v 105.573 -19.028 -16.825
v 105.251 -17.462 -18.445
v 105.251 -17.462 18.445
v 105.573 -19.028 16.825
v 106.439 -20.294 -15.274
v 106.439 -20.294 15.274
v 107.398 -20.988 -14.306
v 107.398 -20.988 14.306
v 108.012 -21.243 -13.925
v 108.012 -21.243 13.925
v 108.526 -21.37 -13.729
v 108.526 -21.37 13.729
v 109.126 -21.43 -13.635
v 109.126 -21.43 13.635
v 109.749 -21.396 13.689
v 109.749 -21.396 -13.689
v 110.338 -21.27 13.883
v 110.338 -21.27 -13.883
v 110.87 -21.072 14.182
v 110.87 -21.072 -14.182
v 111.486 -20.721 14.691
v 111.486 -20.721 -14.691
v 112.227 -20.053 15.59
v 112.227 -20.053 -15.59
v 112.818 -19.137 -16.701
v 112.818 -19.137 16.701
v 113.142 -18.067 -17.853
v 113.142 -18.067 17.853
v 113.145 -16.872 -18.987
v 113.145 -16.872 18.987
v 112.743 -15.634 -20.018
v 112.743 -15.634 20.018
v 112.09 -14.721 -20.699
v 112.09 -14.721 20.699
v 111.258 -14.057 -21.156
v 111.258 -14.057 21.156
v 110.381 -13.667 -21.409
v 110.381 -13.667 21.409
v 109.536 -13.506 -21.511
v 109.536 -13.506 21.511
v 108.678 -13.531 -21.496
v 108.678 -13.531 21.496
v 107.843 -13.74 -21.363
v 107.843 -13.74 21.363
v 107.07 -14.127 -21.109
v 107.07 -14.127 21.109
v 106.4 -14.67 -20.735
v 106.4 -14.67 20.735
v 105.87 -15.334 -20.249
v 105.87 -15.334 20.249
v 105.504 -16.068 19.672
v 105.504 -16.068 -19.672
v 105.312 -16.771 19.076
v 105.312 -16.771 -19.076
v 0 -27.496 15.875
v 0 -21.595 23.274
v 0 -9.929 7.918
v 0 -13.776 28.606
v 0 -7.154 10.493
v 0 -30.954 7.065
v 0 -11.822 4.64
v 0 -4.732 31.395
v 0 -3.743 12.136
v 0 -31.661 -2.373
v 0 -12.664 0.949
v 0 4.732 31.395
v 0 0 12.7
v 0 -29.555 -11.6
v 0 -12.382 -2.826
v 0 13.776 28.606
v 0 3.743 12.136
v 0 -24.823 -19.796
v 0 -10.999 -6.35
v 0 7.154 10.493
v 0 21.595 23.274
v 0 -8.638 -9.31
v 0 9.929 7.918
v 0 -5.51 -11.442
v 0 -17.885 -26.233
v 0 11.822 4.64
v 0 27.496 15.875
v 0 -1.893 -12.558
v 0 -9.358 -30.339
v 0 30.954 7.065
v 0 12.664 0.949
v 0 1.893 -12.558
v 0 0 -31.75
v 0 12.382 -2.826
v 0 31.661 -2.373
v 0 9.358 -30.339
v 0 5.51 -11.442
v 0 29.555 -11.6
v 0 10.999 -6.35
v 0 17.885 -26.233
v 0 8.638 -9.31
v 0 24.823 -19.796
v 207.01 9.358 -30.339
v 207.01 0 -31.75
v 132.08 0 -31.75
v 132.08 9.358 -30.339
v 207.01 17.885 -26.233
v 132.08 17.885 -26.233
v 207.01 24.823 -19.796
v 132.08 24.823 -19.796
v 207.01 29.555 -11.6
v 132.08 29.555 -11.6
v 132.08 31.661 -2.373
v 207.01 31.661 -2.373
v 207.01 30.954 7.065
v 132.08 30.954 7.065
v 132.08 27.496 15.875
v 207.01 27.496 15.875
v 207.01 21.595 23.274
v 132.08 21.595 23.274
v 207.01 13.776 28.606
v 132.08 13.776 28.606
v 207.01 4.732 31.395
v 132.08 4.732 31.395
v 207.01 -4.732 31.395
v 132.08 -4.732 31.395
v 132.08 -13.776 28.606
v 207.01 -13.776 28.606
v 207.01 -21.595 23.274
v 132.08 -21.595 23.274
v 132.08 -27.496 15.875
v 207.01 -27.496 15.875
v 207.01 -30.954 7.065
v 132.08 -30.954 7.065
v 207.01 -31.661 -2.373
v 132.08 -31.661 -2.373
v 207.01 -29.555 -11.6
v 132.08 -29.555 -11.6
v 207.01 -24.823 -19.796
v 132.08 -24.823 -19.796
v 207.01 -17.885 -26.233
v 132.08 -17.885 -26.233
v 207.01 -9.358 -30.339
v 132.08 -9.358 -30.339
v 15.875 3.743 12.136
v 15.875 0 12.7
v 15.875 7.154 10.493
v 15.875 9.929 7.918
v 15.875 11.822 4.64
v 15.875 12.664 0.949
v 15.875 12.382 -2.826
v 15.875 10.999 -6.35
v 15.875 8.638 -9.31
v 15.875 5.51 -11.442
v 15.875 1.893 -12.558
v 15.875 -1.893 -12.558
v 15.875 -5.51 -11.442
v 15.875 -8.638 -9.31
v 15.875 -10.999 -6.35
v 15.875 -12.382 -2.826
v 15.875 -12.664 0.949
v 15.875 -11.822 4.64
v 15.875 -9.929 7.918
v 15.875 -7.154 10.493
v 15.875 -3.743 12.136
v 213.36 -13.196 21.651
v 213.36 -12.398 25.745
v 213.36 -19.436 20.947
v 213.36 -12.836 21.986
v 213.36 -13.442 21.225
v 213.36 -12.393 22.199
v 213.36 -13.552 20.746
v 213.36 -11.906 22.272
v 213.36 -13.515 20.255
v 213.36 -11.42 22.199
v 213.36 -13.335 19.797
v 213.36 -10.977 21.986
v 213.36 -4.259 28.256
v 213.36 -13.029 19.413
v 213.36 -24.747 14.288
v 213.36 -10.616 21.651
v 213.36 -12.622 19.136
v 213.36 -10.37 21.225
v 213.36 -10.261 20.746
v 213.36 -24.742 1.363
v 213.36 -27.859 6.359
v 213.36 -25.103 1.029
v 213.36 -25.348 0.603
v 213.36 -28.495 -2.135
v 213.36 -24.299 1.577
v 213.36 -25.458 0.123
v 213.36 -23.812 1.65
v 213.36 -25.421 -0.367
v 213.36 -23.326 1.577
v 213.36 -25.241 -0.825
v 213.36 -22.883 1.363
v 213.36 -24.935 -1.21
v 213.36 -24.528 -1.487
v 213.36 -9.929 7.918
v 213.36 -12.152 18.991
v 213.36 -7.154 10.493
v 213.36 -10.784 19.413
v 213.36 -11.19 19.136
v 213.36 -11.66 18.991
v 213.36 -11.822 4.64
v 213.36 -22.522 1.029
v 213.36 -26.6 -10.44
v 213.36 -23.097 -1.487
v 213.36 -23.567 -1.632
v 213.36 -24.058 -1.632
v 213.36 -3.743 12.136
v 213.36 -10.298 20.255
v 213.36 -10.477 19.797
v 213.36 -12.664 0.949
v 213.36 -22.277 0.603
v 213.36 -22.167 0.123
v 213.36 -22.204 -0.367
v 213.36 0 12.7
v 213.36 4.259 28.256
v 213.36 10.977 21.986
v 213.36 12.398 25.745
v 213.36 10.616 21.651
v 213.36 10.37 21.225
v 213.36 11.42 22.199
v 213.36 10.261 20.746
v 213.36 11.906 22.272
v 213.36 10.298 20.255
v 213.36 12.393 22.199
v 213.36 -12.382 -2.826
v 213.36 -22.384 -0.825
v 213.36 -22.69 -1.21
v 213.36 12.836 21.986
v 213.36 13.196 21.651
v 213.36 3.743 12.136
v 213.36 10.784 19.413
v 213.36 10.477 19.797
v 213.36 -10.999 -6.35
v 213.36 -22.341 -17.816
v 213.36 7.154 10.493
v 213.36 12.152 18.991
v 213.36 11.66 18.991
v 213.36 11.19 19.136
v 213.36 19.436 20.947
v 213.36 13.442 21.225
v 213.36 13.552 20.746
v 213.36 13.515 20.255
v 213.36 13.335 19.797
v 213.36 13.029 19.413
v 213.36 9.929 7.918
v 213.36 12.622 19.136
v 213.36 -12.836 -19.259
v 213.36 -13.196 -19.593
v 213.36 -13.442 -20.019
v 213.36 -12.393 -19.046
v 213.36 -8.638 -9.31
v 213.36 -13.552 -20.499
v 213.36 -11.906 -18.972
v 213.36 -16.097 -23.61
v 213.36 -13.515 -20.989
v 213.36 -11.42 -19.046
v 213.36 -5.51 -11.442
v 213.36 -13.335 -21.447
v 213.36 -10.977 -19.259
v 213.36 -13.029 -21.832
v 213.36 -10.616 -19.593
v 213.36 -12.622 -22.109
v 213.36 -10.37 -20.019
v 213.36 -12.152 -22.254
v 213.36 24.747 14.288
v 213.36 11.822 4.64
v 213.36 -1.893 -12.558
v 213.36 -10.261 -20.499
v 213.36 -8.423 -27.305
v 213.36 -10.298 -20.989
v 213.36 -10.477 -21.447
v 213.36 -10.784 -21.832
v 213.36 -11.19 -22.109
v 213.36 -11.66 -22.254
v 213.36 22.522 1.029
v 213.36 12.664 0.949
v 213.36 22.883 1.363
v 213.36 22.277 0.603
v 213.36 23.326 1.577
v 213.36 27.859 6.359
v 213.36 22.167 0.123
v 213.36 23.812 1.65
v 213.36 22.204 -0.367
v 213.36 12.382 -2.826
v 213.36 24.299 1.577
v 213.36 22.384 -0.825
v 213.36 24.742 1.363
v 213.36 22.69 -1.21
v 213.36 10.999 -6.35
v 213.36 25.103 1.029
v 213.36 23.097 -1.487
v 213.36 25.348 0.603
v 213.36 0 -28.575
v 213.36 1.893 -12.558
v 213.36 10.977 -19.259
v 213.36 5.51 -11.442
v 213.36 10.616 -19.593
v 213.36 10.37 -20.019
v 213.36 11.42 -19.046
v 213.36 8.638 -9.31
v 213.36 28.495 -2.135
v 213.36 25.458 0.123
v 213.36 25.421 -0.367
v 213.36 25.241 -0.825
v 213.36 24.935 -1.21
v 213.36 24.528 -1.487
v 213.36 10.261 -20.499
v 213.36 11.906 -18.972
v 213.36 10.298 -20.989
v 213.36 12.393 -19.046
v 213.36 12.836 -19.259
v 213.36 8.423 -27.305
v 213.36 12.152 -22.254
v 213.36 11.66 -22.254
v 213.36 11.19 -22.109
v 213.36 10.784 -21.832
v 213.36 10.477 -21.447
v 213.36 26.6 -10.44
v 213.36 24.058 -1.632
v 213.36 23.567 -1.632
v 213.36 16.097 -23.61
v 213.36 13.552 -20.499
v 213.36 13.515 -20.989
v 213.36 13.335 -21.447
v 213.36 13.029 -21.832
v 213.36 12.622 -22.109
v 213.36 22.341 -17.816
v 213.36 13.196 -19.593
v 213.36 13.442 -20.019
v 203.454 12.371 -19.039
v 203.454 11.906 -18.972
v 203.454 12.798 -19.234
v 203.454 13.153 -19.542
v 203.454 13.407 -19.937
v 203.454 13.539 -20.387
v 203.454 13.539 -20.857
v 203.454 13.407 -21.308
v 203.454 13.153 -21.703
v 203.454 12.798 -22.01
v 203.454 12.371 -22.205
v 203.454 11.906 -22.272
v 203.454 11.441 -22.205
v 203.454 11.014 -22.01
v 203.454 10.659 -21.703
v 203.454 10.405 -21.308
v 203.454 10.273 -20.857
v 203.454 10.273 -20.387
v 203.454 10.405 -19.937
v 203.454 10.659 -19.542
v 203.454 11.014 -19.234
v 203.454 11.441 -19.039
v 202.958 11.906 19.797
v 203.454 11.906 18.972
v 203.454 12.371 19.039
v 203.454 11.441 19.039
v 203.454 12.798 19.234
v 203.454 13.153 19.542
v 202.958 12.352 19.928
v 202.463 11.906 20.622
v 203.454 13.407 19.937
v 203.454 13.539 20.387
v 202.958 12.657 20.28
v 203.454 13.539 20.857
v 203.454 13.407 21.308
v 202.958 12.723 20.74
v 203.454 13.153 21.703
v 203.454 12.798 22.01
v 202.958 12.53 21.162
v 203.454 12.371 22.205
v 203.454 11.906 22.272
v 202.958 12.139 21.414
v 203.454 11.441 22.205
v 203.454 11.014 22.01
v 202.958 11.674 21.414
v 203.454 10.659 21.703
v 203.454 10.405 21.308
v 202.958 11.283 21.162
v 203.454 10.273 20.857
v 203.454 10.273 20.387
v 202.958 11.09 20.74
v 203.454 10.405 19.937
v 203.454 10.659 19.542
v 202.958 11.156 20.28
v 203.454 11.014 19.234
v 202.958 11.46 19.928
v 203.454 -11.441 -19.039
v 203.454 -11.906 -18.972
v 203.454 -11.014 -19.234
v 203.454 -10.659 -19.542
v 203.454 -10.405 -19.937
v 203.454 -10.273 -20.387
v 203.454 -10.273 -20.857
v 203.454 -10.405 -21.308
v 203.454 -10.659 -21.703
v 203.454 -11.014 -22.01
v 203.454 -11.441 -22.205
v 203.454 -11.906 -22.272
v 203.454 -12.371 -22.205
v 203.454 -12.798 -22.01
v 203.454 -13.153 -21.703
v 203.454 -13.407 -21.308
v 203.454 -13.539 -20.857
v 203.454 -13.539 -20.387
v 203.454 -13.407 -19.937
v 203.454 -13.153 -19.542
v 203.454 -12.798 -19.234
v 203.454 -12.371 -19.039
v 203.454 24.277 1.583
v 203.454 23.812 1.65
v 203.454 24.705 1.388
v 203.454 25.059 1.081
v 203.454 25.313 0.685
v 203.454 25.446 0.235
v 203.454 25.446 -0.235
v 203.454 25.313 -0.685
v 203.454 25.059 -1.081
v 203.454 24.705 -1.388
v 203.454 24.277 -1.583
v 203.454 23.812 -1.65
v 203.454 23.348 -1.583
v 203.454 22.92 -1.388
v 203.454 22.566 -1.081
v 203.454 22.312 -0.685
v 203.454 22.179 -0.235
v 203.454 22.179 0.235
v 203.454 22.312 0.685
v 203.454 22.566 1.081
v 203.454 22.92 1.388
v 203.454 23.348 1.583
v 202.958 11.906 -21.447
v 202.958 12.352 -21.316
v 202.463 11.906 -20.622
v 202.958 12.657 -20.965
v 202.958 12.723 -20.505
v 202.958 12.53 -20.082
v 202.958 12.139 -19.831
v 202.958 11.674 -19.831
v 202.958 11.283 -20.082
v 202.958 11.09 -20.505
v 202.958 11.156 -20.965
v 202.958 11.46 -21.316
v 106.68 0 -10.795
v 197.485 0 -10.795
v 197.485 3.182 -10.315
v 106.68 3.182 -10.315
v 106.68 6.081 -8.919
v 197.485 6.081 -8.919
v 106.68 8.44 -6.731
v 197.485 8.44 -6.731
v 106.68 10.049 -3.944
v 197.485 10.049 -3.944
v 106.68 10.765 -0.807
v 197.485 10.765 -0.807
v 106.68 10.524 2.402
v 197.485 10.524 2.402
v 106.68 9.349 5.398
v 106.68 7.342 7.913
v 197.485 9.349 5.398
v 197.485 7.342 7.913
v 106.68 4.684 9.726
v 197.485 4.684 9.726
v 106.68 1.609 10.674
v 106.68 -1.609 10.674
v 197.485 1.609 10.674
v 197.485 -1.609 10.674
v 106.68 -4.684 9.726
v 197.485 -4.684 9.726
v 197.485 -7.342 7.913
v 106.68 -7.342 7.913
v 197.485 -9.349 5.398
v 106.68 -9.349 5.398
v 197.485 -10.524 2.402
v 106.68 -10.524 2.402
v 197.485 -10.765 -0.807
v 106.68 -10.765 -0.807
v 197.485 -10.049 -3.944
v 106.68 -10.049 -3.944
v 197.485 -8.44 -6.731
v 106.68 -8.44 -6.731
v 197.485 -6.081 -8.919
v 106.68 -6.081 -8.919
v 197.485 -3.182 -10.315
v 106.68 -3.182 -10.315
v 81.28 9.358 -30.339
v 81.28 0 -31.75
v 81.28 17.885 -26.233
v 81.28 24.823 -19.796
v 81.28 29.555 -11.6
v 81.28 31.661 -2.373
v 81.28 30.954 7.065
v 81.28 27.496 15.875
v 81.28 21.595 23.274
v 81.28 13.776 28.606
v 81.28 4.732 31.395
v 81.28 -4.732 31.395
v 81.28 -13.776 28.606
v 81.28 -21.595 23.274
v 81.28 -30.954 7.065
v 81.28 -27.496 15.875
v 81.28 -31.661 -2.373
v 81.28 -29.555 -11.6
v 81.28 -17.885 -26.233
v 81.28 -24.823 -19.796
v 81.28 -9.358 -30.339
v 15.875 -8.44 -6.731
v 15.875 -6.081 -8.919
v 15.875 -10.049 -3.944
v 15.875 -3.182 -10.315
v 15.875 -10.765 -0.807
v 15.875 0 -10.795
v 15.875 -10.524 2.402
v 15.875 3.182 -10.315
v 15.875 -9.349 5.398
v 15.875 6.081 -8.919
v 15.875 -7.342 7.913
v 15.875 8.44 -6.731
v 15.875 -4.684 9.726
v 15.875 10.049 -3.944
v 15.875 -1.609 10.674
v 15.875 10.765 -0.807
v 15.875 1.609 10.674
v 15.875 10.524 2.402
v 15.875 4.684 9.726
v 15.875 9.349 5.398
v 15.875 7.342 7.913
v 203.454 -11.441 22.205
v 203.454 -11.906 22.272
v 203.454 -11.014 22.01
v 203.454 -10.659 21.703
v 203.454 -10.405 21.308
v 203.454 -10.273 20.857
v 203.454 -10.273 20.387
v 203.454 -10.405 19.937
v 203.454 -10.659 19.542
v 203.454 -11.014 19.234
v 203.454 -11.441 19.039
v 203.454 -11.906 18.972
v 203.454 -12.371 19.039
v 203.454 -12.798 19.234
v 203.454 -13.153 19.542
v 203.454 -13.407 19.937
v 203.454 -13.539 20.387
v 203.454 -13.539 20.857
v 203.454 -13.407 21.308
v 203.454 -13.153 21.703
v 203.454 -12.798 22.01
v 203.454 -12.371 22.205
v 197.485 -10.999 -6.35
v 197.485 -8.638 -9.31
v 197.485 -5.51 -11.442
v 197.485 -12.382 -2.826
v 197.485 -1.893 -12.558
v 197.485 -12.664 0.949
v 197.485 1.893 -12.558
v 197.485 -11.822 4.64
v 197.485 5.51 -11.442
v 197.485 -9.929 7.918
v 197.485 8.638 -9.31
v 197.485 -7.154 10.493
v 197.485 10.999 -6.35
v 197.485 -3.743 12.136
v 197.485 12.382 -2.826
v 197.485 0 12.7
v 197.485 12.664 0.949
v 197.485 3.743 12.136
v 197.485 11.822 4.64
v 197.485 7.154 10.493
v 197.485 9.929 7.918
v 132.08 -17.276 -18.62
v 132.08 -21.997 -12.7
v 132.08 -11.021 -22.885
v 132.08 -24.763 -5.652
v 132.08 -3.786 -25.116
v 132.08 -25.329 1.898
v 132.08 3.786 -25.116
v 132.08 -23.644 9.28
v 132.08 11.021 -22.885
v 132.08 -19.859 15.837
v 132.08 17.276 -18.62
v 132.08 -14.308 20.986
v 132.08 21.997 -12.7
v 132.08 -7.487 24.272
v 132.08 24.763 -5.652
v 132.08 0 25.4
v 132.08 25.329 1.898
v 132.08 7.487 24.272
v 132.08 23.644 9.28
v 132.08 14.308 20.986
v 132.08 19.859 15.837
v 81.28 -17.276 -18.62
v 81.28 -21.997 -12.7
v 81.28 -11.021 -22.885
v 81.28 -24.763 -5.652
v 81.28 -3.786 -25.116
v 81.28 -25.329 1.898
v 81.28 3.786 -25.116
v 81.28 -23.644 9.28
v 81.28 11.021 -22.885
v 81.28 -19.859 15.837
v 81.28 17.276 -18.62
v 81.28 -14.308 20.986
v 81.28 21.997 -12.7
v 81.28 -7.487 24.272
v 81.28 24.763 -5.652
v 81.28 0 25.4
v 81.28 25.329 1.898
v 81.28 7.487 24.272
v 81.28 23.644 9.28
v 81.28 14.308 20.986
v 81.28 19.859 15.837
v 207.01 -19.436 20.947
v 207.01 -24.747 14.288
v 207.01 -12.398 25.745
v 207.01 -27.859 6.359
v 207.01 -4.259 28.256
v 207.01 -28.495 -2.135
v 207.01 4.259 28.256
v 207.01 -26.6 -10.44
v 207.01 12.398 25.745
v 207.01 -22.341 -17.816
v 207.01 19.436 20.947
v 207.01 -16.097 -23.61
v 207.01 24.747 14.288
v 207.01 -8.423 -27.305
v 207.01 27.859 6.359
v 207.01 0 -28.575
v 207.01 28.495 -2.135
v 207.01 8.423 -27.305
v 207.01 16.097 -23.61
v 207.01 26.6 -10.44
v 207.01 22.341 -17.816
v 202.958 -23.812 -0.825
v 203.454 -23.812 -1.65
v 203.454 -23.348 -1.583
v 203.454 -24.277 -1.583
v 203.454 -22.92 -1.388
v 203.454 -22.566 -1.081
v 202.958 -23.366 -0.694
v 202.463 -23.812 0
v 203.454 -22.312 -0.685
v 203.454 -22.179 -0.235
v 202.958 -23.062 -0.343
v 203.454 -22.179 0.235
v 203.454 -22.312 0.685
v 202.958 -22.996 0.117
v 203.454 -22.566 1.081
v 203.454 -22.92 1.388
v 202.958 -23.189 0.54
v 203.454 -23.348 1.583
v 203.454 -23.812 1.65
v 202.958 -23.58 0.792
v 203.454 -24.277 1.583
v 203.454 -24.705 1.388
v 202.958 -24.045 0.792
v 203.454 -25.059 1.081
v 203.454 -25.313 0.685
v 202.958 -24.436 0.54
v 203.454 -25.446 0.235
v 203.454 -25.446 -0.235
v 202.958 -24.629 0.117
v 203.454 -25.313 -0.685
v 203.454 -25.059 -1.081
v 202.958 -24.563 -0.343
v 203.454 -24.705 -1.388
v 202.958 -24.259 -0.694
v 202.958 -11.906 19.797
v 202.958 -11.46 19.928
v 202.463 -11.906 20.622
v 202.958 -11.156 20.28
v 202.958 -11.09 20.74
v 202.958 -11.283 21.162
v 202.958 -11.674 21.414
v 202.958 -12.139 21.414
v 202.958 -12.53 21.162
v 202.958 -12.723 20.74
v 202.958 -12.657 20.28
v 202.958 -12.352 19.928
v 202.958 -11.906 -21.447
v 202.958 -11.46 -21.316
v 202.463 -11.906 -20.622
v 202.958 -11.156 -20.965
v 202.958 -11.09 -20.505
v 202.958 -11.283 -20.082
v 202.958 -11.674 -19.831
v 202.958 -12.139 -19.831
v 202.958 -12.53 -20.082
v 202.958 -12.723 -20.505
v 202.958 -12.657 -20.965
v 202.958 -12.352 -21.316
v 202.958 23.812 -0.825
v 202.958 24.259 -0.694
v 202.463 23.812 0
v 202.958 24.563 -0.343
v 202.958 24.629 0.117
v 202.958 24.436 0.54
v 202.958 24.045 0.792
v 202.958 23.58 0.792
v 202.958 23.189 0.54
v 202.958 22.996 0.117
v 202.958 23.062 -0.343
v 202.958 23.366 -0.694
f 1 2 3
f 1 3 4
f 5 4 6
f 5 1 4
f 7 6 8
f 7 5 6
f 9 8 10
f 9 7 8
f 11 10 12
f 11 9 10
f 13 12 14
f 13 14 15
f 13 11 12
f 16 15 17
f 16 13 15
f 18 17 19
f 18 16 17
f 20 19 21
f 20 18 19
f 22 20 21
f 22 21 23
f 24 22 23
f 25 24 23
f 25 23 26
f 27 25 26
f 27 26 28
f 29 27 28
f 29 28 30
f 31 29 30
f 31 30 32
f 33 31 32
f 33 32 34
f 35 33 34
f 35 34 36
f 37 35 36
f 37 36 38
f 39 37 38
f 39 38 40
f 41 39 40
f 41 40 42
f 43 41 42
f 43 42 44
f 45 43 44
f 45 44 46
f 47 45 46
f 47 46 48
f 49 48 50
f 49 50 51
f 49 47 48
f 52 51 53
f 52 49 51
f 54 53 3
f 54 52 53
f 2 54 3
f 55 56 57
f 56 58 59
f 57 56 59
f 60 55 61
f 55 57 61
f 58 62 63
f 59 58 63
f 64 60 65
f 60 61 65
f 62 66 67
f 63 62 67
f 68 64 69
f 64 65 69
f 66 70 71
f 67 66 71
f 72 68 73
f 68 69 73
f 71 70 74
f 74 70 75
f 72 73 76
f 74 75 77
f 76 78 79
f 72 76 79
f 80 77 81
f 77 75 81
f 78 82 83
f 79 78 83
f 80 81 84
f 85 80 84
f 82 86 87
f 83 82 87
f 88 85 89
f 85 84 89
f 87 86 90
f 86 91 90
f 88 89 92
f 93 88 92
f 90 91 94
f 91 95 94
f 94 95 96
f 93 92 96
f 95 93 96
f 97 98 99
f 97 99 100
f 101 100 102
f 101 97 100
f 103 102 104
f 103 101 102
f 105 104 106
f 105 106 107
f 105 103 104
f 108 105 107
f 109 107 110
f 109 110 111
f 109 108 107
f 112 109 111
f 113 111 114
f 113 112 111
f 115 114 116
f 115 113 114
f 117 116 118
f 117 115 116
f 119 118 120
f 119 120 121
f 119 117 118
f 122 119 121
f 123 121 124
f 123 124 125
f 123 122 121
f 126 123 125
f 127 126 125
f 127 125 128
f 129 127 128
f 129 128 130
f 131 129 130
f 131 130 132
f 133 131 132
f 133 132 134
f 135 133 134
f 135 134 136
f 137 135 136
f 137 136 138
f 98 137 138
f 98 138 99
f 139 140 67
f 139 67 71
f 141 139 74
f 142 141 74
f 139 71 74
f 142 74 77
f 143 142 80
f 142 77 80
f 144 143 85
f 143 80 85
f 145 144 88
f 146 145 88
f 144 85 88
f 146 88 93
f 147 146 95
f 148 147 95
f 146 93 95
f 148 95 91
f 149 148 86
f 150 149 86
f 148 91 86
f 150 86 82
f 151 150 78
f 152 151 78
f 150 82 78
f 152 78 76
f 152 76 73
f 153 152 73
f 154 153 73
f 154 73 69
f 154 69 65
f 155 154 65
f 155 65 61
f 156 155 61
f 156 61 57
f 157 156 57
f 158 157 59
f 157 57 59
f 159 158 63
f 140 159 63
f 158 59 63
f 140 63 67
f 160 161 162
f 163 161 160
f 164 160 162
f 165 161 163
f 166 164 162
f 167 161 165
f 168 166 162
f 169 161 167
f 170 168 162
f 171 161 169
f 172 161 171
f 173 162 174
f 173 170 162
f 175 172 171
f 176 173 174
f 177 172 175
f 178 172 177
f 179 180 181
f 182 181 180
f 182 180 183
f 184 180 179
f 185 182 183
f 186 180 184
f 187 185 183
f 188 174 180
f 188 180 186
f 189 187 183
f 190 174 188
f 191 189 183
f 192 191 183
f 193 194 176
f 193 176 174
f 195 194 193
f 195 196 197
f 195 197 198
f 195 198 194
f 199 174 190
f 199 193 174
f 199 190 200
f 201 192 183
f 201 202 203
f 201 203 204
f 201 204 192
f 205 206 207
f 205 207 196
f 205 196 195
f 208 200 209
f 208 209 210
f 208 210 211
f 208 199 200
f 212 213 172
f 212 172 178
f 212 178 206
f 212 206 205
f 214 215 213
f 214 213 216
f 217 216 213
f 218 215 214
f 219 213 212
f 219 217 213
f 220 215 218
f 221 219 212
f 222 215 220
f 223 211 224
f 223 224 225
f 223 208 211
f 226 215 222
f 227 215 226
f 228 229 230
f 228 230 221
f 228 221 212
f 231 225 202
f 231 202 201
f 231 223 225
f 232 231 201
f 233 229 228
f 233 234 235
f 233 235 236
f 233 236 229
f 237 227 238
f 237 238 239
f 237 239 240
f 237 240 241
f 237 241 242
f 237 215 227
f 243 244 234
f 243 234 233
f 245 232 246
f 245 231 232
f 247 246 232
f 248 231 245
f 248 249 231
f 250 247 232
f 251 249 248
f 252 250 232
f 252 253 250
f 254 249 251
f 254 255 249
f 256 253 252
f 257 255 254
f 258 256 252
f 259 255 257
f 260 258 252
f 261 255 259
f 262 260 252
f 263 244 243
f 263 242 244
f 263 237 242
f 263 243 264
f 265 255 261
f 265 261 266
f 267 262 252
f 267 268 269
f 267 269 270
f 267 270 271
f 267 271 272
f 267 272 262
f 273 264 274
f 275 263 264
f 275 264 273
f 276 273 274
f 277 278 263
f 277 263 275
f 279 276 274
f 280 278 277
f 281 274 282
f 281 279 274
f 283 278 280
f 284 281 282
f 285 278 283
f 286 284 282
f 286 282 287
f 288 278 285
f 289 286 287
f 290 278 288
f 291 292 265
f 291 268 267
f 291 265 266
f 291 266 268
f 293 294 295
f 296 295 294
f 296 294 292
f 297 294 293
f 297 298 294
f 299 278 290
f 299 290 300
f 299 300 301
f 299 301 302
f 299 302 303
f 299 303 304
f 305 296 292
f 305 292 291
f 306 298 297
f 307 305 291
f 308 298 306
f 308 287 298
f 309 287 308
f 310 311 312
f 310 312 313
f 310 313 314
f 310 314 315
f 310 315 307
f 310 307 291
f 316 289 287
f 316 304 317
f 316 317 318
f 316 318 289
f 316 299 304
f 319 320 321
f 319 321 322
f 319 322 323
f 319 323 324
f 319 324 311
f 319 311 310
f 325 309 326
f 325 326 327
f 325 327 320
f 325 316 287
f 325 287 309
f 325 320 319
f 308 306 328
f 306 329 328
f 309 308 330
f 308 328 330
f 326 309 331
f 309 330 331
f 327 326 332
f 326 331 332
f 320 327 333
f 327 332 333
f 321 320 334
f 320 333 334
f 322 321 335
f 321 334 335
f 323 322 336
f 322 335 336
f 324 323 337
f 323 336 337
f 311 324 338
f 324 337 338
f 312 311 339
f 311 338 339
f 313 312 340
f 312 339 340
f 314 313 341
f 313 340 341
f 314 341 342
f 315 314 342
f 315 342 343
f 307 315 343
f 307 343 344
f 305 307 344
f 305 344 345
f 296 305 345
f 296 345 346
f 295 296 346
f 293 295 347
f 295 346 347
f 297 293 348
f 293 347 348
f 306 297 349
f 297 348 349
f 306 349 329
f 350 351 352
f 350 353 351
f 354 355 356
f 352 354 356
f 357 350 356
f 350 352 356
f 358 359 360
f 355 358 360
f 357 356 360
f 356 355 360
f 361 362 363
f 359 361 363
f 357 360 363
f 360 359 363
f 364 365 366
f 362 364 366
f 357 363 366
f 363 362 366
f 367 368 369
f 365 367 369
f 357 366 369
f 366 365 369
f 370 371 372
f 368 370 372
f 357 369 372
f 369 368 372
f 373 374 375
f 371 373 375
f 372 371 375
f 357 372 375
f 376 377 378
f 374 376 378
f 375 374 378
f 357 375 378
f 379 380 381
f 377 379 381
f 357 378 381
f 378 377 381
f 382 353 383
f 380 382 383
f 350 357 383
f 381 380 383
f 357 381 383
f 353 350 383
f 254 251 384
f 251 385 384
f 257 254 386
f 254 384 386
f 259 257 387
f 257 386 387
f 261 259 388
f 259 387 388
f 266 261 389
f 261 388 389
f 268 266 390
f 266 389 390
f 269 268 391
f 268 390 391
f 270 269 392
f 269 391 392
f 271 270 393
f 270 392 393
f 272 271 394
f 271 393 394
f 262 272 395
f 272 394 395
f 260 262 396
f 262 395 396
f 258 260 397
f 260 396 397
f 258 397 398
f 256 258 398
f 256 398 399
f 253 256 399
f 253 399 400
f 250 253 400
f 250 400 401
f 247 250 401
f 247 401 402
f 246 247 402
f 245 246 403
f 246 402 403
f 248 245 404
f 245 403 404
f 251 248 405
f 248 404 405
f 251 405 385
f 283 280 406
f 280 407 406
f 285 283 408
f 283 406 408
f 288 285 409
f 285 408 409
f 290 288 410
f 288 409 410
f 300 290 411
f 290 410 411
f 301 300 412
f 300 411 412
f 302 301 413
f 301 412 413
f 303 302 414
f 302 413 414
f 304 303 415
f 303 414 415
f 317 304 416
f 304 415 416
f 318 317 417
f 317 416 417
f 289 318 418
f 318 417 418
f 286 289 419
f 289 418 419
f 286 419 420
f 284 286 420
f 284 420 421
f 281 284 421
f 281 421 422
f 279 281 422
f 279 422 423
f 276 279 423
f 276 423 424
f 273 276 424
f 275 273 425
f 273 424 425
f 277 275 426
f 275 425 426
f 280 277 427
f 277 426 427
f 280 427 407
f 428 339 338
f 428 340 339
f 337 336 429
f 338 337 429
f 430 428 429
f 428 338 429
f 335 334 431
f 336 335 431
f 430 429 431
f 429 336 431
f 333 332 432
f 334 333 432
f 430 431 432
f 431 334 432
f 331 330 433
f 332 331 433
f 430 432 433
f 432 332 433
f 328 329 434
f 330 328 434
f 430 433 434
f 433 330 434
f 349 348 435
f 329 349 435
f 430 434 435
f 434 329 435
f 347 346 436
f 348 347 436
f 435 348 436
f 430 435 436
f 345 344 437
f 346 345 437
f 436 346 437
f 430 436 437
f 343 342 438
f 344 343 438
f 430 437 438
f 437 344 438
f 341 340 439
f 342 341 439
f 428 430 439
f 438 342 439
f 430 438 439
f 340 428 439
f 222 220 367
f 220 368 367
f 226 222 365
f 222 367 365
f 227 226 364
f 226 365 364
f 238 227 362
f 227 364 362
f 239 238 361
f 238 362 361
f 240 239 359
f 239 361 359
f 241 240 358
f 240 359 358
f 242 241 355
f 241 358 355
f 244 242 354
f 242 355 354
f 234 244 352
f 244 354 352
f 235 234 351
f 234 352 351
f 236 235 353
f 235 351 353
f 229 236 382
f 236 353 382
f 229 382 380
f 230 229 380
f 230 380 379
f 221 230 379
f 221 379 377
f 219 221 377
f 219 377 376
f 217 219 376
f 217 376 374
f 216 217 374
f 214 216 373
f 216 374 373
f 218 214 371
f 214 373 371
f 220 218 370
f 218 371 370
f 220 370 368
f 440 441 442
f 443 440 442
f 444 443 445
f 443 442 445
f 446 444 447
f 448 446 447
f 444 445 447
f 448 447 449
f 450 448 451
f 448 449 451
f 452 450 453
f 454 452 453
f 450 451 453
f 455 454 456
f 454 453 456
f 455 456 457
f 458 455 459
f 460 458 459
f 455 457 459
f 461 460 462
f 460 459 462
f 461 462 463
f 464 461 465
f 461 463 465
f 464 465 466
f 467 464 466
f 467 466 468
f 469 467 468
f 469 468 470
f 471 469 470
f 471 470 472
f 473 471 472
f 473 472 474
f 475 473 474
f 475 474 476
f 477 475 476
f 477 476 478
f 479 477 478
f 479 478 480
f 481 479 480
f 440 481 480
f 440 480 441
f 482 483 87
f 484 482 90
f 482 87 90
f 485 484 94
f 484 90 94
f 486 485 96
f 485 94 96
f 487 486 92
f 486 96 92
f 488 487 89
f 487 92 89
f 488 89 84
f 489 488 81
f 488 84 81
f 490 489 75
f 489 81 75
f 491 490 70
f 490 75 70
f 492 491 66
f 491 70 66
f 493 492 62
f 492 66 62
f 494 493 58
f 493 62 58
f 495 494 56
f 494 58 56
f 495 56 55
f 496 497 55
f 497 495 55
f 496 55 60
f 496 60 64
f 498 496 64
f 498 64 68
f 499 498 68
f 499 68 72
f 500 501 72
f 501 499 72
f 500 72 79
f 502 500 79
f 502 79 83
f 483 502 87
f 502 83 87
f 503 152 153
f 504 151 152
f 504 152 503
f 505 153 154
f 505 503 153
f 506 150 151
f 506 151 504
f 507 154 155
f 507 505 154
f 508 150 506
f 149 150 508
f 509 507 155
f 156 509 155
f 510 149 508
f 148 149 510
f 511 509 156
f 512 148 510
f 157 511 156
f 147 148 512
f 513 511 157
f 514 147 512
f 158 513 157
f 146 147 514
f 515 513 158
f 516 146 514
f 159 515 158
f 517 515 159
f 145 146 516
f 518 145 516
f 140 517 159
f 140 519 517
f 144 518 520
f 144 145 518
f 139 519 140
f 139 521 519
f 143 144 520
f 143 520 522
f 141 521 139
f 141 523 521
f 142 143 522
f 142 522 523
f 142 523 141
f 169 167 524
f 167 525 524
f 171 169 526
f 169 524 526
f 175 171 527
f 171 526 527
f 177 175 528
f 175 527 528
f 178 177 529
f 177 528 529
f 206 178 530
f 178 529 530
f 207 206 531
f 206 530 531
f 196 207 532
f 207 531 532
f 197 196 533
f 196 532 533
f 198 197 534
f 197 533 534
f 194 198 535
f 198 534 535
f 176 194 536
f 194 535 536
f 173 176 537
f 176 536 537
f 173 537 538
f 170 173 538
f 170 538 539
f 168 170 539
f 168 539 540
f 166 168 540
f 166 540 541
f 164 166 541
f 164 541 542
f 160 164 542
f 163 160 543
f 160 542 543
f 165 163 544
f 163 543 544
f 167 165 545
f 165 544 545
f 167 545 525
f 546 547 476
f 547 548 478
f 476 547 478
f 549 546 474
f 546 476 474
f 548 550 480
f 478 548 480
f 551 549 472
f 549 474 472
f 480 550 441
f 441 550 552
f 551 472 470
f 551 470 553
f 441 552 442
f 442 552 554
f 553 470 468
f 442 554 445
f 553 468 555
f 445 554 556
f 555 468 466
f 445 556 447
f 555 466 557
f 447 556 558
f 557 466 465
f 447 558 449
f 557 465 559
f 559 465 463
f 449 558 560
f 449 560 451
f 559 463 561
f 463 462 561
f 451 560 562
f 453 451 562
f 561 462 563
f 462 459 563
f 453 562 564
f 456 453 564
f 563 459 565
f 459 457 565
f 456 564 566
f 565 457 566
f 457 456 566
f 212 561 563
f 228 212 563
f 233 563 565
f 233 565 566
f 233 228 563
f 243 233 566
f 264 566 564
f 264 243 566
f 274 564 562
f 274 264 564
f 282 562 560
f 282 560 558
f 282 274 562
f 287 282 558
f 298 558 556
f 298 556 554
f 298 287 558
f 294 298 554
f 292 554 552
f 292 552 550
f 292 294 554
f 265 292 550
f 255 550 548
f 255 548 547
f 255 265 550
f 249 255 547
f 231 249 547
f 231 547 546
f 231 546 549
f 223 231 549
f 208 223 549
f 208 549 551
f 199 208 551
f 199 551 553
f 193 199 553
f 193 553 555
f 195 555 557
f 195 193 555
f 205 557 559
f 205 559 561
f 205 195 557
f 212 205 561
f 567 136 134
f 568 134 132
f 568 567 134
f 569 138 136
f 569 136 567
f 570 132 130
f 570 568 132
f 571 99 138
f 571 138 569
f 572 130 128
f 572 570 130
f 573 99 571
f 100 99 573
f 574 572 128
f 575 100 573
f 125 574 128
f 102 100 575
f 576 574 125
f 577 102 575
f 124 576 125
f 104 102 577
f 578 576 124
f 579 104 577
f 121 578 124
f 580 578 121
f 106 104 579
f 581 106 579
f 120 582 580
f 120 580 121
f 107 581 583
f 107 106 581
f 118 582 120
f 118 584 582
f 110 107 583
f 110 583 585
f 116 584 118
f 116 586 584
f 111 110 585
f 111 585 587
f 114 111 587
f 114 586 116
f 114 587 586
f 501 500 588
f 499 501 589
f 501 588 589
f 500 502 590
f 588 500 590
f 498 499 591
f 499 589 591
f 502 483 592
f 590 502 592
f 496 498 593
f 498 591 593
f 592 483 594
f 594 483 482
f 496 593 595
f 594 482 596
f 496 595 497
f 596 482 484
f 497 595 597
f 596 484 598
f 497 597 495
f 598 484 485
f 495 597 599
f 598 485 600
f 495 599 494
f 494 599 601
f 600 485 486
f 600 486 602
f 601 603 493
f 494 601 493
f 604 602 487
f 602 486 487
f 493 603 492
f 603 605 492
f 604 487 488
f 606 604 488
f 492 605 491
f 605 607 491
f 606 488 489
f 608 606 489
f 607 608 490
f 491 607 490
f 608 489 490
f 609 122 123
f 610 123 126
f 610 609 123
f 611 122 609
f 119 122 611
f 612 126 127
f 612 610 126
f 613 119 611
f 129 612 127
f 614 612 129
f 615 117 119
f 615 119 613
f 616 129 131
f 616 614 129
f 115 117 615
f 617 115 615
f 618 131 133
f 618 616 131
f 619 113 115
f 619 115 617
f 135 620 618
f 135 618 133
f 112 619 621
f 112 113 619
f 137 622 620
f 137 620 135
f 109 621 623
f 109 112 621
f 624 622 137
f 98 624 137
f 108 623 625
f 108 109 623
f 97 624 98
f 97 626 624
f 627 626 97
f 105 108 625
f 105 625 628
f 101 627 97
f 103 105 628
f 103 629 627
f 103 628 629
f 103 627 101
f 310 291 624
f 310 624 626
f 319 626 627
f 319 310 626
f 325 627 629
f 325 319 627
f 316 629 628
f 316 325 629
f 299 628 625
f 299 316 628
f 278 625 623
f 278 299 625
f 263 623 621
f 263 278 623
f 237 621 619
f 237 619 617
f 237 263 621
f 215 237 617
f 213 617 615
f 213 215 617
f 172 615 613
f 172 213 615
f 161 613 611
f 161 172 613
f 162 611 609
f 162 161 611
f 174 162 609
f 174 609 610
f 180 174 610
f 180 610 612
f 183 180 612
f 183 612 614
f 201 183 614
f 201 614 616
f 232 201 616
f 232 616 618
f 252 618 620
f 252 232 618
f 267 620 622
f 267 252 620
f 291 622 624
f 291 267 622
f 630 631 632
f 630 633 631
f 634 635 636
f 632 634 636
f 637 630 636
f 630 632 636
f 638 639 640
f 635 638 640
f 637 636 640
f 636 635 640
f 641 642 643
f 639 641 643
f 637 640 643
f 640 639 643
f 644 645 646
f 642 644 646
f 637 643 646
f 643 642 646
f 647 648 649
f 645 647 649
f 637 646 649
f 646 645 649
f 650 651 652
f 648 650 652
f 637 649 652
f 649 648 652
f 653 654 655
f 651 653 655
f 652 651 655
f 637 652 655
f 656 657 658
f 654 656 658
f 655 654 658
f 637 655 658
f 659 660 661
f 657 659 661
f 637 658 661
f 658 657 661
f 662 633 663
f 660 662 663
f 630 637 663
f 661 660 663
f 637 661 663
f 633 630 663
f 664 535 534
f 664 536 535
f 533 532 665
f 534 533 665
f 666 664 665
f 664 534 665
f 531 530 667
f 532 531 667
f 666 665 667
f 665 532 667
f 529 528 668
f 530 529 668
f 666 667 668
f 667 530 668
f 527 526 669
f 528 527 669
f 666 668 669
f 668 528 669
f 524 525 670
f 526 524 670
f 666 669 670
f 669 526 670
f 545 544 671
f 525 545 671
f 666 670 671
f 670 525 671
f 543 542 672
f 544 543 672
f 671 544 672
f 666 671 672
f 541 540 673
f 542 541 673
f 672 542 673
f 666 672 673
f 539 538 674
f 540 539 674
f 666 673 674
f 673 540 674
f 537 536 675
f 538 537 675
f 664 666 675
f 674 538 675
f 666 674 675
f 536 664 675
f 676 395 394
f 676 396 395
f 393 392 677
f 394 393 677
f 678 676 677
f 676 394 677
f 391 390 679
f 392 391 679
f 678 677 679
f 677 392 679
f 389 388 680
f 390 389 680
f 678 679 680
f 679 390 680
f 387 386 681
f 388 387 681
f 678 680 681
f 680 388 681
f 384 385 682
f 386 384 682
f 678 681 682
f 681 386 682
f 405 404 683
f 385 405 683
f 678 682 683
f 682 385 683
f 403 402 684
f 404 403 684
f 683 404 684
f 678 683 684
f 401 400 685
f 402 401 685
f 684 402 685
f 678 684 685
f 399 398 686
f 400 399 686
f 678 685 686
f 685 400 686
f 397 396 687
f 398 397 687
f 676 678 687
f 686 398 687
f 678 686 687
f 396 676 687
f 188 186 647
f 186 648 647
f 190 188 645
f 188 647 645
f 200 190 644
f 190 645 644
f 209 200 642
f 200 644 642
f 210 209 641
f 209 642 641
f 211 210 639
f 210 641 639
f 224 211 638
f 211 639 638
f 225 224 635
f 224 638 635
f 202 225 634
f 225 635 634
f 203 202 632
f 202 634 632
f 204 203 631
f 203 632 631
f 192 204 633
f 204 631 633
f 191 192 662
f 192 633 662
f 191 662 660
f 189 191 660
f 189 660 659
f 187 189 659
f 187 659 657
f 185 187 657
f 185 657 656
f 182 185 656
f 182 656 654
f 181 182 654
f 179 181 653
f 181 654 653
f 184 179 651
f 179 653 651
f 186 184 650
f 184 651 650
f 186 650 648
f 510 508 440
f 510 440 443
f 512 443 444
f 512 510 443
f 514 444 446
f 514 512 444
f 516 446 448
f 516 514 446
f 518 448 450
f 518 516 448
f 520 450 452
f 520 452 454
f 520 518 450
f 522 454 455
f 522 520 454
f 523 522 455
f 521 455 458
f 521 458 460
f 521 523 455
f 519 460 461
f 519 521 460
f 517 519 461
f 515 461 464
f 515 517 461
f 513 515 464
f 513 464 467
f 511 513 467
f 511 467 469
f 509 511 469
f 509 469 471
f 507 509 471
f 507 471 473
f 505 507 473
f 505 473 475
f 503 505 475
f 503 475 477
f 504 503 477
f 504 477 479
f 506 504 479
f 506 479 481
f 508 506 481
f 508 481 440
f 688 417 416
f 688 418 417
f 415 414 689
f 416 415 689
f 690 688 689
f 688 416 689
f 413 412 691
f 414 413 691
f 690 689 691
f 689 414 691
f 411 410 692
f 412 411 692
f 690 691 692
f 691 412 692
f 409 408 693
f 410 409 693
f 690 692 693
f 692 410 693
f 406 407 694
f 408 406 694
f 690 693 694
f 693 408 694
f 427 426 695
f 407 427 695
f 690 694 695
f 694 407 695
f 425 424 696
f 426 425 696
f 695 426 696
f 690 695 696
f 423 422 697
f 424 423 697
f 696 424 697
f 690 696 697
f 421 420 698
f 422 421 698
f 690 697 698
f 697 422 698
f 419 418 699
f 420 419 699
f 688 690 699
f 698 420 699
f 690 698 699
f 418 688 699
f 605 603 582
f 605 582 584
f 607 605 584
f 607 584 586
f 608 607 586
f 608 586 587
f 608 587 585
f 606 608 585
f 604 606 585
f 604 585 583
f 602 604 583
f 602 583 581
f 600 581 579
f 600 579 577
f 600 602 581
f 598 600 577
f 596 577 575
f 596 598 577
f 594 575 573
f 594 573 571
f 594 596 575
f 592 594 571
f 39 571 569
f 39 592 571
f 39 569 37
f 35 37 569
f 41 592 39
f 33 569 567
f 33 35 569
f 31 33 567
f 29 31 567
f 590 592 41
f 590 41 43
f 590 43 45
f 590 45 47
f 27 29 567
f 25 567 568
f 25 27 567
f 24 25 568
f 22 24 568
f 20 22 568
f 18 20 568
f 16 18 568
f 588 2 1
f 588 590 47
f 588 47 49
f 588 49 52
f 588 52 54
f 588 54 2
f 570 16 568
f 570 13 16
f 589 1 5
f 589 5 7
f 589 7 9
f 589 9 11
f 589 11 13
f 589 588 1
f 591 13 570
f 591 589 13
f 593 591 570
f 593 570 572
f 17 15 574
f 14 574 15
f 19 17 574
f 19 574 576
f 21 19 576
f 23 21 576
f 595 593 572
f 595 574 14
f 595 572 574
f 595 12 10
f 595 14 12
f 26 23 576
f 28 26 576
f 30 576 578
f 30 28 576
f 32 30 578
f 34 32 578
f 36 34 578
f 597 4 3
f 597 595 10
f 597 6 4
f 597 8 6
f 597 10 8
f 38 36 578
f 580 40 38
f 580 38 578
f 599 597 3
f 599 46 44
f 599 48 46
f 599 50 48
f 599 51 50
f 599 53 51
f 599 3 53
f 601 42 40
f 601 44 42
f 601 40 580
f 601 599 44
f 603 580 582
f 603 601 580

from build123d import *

# Parameters (mm, degrees)
SKETCH1_R                 = 31.75
SKETCH1_R_2               = 10.795
BOSS_EXTRUDE1_DEPTH       = 106.68
SKETCH2_R                 = 12.7
CUT_EXTRUDE1_DEPTH        = 15.875
CUT_EXTRUDE2_START        = -81.28
SKETCH3_OUTSIDE_W         = 111.798
SKETCH3_OUTSIDE_H         = 111.798
SKETCH3_OUTSIDE_R         = 25.4
CUT_EXTRUDE2_DEPTH        = 50.8
CUT_EXTRUDE3_DEPTH        = 25.4
CUT_EXTRUDE3_DEPTH_BACK   = 25.4
SKETCH5_R                 = 3.96875
M4X0_7_TAPPED_HOLE1_D     = 3.3
M4X0_7_TAPPED_HOLE1_DEPTH = 9.906
M4X0_7_TAPPED_HOLE1_TIP   = 0.991420021
SKETCH11_OUTSIDE_W        = 111.798
SKETCH11_OUTSIDE_H        = 111.798
SKETCH11_OUTSIDE_R        = 28.575
CUT_EXTRUDE4_DEPTH        = 6.35


with BuildPart() as part:
    # Sketch1 → Boss-Extrude1 (new body)
    with BuildSketch(Plane(origin=(0, 0, 0), x_dir=(0, 0, -1), z_dir=(1, 0, 0))):
        Circle(SKETCH1_R)
        Circle(SKETCH1_R_2, mode=Mode.SUBTRACT)
    boss_extrude1 = extrude(amount=BOSS_EXTRUDE1_DEPTH)

    # Sketch2 → Cut-Extrude1 (cut)
    with BuildSketch(Plane.ZY):
        Circle(SKETCH2_R)
    cut_extrude1 = extrude(amount=-CUT_EXTRUDE1_DEPTH, mode=Mode.SUBTRACT)

    # Mirror1: Boss-Extrude1, Cut-Extrude1 across plane
    add(boss_extrude1.mirror(Plane(origin=(106.68, 0, 0), x_dir=(0, 0, 1), z_dir=(1, 0, 0))))
    add(cut_extrude1.mirror(Plane(origin=(106.68, 0, 0), x_dir=(0, 0, 1), z_dir=(1, 0, 0))), mode=Mode.SUBTRACT)

    # Sketch3 outside → Cut-Extrude2 (cut)
    with BuildSketch(Plane.ZY.offset(CUT_EXTRUDE2_START)):
        Rectangle(SKETCH3_OUTSIDE_W, SKETCH3_OUTSIDE_H)
        Circle(SKETCH3_OUTSIDE_R, mode=Mode.SUBTRACT)
    extrude(amount=-CUT_EXTRUDE2_DEPTH, mode=Mode.SUBTRACT)

    # Sketch5 → Cut-Extrude3 (cut, two sides: drawn at the far end of the back side and taken through both)
    with BuildSketch(Plane.XY.offset(-CUT_EXTRUDE3_DEPTH_BACK)):
        with Locations((109.22, -17.4625)):
            Circle(SKETCH5_R)
    extrude(amount=CUT_EXTRUDE3_DEPTH + CUT_EXTRUDE3_DEPTH_BACK, mode=Mode.SUBTRACT)

    # M4x0.7 Tapped Hole1
    with Locations(Plane(origin=(213.36, 0, 0), x_dir=(0, 0, -1), z_dir=(1, 0, 0))):
        with Locations((20.622229928, -11.90625), (0, -23.8125), (20.622229928, 11.90625), (0, 23.8125), (-20.622229928, 11.90625), (-20.622229928, -11.90625)):
            Hole(M4X0_7_TAPPED_HOLE1_D / 2, depth=M4X0_7_TAPPED_HOLE1_DEPTH)
            with Locations((0, 0, -(M4X0_7_TAPPED_HOLE1_DEPTH + M4X0_7_TAPPED_HOLE1_TIP / 2))):  # 118° drill point
                Cone(0, M4X0_7_TAPPED_HOLE1_D / 2, M4X0_7_TAPPED_HOLE1_TIP, mode=Mode.SUBTRACT)

    # Sketch11 outside → Cut-Extrude4 (cut)
    with BuildSketch(Plane(origin=(213.36, 0, 0), x_dir=(0, 0, -1), z_dir=(1, 0, 0))):
        Rectangle(SKETCH11_OUTSIDE_W, SKETCH11_OUTSIDE_H)
        Circle(SKETCH11_OUTSIDE_R, mode=Mode.SUBTRACT)
    extrude(amount=-CUT_EXTRUDE4_DEPTH, mode=Mode.SUBTRACT)


solid = part.part
